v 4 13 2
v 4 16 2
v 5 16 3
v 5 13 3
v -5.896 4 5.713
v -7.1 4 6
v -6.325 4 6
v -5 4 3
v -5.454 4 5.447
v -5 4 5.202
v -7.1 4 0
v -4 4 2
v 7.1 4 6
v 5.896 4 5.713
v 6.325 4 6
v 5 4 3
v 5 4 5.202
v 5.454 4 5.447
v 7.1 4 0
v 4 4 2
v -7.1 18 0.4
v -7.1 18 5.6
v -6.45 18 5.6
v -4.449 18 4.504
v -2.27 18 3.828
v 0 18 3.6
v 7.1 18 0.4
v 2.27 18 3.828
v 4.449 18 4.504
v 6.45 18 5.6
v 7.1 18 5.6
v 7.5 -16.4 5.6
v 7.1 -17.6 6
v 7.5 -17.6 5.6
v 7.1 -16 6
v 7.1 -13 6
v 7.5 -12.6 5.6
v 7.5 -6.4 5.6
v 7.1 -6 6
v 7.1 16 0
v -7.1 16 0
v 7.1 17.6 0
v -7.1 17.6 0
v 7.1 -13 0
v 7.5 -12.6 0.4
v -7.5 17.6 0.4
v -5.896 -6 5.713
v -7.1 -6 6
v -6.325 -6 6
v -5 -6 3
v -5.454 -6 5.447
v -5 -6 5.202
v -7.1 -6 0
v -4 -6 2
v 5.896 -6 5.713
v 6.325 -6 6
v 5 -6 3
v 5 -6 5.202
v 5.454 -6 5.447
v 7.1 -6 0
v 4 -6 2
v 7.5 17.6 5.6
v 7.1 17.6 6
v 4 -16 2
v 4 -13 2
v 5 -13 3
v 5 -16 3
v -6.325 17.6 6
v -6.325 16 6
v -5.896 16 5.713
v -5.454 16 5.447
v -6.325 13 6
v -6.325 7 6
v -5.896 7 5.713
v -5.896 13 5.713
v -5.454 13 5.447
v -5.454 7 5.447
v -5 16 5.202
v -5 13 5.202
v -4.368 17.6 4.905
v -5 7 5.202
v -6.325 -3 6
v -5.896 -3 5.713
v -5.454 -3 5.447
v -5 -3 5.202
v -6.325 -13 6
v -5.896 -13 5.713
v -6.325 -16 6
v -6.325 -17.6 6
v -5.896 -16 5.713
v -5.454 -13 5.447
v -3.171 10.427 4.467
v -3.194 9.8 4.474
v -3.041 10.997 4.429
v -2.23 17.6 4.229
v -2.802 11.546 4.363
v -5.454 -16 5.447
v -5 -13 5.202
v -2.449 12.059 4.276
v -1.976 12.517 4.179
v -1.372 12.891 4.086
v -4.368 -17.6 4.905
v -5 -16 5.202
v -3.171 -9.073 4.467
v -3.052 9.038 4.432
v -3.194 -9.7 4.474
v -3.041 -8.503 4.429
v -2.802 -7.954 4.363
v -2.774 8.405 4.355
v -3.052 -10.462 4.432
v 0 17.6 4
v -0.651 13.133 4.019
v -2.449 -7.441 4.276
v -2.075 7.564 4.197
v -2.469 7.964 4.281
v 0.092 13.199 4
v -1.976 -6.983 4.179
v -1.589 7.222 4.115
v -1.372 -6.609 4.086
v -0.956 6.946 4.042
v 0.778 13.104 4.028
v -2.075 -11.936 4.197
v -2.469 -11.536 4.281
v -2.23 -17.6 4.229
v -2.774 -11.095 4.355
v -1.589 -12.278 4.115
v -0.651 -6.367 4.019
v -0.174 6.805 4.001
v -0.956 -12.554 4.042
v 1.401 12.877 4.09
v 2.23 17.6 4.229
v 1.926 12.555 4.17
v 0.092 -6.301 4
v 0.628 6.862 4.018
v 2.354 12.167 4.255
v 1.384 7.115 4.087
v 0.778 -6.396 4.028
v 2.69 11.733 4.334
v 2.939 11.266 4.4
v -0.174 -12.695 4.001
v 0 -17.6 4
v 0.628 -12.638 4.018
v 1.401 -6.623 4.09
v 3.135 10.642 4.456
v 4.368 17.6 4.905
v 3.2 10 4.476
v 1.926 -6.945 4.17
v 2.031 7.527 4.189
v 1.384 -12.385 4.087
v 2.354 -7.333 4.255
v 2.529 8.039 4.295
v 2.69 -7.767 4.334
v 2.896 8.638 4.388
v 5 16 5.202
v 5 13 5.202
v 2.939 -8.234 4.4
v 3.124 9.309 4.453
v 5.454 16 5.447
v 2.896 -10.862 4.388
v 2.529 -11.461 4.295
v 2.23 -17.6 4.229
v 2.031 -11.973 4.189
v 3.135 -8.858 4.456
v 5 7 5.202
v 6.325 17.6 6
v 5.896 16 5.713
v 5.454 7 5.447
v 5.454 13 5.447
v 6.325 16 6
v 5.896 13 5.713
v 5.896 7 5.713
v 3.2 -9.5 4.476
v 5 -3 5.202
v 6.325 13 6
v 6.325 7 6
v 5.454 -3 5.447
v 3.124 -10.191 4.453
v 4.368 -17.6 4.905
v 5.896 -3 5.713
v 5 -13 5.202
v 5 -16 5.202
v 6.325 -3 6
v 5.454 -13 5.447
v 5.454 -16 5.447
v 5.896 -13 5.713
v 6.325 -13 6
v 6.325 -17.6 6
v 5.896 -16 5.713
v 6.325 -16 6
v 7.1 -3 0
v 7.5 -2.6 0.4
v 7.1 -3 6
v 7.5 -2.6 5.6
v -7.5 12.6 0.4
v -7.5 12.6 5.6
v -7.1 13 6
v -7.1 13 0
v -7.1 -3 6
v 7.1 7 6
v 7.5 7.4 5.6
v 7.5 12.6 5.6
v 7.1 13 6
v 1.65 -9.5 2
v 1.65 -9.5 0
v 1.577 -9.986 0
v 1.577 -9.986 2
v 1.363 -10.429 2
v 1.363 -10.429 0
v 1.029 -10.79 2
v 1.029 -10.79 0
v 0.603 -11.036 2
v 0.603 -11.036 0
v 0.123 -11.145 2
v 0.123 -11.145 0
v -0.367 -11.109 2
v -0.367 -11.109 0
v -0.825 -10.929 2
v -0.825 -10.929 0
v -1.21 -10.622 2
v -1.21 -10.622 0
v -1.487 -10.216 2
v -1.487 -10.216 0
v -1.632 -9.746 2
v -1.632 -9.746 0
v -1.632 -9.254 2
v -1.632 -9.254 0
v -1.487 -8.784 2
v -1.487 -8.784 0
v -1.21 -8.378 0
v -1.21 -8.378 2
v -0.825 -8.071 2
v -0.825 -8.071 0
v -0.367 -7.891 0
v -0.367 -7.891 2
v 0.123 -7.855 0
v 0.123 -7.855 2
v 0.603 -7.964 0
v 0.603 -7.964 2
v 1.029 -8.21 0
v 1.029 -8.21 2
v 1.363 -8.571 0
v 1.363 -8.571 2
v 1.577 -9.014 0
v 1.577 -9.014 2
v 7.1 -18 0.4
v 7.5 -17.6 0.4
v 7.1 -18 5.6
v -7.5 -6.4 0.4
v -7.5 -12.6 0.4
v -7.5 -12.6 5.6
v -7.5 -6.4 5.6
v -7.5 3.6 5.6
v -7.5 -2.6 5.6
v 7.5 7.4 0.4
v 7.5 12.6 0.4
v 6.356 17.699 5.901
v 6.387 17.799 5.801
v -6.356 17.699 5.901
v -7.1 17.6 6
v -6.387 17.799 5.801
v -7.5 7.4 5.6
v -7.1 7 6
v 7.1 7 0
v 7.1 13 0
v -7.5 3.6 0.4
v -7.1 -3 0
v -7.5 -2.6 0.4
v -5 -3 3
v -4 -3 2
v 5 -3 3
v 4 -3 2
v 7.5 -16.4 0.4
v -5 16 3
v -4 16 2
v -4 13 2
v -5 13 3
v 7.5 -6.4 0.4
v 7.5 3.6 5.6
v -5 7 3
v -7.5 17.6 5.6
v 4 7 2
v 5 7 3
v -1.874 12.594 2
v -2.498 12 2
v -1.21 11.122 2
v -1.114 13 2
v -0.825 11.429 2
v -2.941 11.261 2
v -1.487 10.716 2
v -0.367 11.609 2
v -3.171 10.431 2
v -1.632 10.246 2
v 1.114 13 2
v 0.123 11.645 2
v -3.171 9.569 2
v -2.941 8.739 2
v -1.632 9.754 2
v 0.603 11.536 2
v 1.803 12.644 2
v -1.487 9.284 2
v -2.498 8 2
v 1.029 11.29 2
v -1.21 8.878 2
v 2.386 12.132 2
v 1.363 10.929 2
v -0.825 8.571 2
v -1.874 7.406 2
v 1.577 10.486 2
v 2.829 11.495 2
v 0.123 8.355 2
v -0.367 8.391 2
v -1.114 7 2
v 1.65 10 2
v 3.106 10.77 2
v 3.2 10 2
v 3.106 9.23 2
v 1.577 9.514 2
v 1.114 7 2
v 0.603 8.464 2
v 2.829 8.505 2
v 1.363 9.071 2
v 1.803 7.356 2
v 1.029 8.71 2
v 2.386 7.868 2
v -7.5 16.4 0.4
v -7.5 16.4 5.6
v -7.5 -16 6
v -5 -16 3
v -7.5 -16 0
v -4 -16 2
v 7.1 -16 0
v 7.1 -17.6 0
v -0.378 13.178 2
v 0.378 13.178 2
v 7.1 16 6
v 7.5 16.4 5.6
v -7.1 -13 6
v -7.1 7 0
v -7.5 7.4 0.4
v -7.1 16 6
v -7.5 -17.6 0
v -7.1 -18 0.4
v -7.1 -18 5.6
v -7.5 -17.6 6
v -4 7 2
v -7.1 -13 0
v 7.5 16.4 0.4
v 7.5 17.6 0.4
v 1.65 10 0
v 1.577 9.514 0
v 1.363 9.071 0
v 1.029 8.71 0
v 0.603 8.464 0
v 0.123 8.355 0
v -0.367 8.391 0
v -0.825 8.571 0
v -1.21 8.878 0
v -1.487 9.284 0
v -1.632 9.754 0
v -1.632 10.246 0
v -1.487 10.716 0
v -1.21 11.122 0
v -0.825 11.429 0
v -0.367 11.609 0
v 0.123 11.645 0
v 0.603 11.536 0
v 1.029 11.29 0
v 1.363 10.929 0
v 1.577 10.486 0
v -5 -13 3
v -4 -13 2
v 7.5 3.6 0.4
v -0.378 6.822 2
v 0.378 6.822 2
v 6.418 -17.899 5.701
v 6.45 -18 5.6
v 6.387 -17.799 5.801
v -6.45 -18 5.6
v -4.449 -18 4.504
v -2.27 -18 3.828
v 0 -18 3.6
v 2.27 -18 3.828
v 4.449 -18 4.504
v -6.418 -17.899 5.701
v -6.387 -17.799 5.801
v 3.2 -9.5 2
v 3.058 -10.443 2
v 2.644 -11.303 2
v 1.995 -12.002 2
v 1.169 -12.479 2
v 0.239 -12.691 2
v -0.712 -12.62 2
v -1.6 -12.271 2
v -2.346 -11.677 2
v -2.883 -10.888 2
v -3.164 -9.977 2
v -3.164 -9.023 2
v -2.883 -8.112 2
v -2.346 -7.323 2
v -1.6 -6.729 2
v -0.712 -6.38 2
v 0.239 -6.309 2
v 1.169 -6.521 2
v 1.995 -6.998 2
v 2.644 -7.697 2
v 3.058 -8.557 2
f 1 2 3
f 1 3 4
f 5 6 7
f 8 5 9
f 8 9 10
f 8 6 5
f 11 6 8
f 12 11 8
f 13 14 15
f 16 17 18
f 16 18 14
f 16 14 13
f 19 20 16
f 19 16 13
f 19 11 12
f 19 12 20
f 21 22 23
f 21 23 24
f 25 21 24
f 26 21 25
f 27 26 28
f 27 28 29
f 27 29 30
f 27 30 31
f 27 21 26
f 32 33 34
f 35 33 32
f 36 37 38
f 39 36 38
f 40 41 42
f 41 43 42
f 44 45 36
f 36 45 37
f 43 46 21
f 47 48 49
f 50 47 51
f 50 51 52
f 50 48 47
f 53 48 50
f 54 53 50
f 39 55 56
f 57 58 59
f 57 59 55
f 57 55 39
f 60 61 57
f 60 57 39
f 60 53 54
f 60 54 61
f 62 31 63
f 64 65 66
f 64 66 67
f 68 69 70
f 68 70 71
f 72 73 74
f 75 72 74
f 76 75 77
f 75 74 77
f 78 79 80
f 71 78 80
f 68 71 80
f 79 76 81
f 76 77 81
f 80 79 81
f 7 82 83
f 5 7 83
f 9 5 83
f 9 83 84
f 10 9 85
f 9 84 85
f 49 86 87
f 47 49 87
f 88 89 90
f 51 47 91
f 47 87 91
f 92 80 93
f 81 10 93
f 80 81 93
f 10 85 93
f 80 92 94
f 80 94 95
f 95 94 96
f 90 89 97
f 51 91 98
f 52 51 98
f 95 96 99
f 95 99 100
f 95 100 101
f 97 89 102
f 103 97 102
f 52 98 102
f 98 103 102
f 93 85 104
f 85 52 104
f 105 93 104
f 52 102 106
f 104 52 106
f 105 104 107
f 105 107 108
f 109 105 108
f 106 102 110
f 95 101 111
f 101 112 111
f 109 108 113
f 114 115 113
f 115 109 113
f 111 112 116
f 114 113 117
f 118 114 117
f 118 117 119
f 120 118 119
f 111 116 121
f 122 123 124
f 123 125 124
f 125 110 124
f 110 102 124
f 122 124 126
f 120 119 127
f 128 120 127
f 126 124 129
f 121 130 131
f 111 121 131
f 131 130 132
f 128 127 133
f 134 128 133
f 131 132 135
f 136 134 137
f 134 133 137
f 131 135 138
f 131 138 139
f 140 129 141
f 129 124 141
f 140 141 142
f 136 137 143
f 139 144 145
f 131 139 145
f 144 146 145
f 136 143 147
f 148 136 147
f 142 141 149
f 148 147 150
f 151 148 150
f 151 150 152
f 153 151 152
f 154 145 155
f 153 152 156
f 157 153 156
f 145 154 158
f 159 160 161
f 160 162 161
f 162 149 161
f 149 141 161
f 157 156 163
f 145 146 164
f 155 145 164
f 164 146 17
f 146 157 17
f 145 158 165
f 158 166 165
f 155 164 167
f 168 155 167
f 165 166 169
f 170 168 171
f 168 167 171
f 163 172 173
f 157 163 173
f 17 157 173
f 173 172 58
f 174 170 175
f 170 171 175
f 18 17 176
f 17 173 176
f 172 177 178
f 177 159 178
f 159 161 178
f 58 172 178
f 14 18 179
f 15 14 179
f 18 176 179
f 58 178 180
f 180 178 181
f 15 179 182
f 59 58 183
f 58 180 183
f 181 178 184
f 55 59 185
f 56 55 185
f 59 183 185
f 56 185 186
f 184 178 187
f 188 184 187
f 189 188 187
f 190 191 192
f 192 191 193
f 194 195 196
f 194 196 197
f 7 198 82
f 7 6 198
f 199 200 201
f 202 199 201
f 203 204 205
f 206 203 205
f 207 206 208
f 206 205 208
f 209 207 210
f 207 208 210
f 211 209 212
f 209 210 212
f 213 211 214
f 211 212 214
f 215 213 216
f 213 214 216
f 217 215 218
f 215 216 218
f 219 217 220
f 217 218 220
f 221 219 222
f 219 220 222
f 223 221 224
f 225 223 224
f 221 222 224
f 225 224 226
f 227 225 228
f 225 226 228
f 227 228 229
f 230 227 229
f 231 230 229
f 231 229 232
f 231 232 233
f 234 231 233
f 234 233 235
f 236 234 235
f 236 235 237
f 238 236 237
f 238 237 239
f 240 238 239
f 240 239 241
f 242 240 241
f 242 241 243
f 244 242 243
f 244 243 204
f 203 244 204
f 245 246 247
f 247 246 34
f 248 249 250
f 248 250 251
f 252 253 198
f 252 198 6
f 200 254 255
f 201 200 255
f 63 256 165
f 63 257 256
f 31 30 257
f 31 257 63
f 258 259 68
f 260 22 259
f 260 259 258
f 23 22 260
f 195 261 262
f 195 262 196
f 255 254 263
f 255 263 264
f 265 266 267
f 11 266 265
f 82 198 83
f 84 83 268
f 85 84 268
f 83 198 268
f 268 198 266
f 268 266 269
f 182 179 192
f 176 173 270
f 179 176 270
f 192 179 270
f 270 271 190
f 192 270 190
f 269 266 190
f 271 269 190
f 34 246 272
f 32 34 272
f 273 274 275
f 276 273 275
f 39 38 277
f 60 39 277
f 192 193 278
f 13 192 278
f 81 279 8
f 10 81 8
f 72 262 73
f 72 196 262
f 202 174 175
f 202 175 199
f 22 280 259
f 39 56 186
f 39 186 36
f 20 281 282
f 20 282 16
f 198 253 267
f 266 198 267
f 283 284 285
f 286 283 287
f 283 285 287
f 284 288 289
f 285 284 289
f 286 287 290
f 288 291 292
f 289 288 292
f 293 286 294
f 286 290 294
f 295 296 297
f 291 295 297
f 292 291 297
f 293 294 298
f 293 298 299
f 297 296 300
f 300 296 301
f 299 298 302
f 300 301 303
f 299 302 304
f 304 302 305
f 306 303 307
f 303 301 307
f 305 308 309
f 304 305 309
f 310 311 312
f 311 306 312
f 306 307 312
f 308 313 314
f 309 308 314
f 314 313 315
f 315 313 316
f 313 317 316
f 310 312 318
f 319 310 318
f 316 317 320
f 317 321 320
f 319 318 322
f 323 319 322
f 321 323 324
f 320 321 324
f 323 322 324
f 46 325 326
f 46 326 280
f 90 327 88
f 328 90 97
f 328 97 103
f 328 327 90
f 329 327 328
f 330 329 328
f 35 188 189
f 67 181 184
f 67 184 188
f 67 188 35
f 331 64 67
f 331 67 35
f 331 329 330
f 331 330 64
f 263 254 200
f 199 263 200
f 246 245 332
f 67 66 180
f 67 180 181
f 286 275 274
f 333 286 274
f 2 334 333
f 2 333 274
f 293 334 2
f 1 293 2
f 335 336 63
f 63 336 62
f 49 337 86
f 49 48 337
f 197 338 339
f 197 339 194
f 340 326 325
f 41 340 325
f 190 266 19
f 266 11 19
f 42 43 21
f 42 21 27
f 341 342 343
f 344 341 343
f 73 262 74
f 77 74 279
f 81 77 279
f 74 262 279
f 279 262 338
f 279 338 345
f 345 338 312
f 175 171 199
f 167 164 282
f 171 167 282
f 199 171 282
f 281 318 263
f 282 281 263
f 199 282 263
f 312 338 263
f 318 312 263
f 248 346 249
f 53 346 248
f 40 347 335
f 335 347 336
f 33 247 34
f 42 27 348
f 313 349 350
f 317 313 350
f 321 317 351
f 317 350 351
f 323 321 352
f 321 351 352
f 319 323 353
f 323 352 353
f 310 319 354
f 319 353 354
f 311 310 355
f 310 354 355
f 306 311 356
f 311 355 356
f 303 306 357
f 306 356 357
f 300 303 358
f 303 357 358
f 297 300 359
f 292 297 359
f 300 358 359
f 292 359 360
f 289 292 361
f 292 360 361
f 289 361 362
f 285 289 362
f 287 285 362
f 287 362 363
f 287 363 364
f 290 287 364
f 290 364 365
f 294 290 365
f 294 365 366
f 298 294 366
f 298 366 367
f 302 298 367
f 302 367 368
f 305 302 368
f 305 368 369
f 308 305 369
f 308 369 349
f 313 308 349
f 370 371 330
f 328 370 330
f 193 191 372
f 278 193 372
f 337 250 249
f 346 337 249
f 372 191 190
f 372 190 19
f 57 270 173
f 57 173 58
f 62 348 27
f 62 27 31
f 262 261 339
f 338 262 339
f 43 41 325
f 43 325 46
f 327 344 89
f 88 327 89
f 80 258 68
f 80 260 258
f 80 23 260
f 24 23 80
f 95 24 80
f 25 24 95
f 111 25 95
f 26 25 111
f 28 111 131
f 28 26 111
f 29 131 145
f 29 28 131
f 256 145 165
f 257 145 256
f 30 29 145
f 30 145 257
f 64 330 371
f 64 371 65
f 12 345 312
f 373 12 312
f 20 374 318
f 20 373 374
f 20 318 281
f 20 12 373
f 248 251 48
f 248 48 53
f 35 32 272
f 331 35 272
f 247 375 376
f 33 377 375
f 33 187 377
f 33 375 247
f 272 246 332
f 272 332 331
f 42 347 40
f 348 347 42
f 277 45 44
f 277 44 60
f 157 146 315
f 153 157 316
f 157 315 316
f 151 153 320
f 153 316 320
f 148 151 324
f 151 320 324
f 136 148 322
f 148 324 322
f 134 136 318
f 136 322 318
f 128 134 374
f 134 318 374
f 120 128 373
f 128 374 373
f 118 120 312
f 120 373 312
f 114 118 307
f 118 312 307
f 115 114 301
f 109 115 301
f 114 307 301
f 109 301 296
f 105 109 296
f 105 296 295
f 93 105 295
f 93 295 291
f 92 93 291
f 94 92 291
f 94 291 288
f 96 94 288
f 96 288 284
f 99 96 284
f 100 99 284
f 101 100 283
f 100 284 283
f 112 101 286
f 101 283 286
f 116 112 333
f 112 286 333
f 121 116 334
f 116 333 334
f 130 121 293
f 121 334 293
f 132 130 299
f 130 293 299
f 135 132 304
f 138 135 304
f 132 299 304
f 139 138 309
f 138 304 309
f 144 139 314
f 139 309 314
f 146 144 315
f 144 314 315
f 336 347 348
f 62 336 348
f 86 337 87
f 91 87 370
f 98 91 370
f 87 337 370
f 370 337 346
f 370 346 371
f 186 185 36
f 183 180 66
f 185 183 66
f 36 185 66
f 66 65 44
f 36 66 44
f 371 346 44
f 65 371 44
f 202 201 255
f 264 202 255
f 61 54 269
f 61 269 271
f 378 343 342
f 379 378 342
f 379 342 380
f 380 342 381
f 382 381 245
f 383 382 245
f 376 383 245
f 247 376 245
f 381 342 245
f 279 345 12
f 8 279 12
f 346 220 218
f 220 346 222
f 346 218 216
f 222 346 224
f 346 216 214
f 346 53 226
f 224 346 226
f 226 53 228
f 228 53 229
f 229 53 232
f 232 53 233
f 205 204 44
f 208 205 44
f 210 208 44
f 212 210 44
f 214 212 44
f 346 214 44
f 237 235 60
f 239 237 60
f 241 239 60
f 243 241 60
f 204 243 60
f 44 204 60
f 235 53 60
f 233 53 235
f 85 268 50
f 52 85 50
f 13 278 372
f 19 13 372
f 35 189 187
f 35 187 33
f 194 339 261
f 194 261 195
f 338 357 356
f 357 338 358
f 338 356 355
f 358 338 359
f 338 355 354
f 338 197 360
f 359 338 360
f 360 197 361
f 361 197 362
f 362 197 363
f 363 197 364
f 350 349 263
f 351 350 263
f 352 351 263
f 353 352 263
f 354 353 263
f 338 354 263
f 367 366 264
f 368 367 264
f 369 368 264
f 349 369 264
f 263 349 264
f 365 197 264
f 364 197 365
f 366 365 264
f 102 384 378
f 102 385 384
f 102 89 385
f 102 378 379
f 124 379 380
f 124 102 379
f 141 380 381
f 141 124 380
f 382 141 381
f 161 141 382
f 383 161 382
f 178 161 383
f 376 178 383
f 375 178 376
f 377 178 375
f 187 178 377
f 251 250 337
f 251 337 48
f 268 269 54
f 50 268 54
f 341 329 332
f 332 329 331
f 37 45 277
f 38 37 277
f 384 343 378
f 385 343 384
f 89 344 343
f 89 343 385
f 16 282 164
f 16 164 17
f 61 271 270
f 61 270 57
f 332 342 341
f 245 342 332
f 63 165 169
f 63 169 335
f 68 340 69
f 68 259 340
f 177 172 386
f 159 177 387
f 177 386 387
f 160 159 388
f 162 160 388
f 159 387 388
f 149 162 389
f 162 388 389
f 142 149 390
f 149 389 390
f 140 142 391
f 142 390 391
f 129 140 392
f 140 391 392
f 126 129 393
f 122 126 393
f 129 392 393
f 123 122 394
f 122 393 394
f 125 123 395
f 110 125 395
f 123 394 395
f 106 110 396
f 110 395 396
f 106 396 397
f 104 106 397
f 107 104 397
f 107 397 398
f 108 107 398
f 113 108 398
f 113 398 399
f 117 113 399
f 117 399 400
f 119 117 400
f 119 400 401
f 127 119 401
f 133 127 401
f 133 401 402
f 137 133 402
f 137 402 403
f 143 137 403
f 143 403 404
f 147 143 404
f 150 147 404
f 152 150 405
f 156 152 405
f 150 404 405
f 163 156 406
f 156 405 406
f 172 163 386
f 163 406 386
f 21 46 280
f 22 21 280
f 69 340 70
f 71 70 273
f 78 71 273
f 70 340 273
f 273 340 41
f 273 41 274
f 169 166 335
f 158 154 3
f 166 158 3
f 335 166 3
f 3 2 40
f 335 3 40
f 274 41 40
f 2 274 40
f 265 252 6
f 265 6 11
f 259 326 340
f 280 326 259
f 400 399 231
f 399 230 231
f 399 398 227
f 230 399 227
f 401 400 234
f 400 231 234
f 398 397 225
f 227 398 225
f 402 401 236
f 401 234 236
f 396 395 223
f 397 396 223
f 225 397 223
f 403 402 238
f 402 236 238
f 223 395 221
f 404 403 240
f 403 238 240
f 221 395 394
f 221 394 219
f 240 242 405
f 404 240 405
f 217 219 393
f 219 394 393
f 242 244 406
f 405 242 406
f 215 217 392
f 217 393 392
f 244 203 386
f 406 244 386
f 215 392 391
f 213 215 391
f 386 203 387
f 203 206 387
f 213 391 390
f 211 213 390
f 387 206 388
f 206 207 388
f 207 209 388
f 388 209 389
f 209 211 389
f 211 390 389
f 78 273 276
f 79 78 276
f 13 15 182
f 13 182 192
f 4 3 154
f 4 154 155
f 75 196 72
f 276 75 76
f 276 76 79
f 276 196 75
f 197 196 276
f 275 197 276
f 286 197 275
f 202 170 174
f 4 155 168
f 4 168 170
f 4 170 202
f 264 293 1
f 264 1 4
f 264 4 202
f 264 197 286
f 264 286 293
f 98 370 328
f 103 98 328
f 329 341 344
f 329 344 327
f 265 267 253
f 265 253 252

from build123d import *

# Parameters (mm, degrees)
SKETCH_W                                   = 15
SKETCH_H                                   = 36
PAD_DEPTH                                  = 6
SKETCH001_W                                = 20
SKETCH001_H                                = 3
POCKET_DEPTH                               = 2
SKETCH002_W                                = 3
SKETCH002_H                                = 3
POCKET001_DEPTH                            = 6.001
SKETCH003_R                                = 11
POCKET002_DEPTH                            = 36.001
SKETCH004_R                                = 1.65
POCKET003_DEPTH                            = 6.001
SKETCH005_R                                = 3.2
POCKET004_DEPTH                            = 4.001
CHAMFER004013007011015006009007001023_SIZE = 0.4
CHAMFER004013007011015006009007001024_SIZE = 1


with BuildPart() as part:
    # Sketch → Pad (new body)
    with BuildSketch(Plane.XY):
        Rectangle(SKETCH_W, SKETCH_H)
    extrude(amount=PAD_DEPTH)

    # Sketch001 (on Face5 of Pad) → Pocket (cut)
    with BuildSketch(Plane(origin=(0, 0, 0), x_dir=(1, 0, 0), z_dir=(0, 0, -1))):
        with Locations((0, 14.5)):
            Rectangle(SKETCH001_W, SKETCH001_H)
        with Locations((0, 4.5)):
            Rectangle(SKETCH001_W, SKETCH001_H)
        with Locations((0, -5.5)):
            Rectangle(SKETCH001_W, SKETCH001_H)
        with Locations((0, -14.5)):
            Rectangle(SKETCH001_W, SKETCH001_H)
    extrude(amount=-POCKET_DEPTH, mode=Mode.SUBTRACT)

    # Sketch002 (on Face10 of Pocket) → Pocket001 (cut, through all)
    with BuildSketch(Plane(origin=(0, 0, 0), x_dir=(1, 0, 0), z_dir=(0, 0, -1))):
        with Locations((-6.5, 14.5)):
            Rectangle(SKETCH002_W, SKETCH002_H)
        with Locations((6.5, 14.5)):
            Rectangle(SKETCH002_W, SKETCH002_H)
        with Locations((-6.5, 4.5)):
            Rectangle(SKETCH002_W, SKETCH002_H)
        with Locations((6.5, 4.5)):
            Rectangle(SKETCH002_W, SKETCH002_H)
        with Locations((-6.5, -5.5)):
            Rectangle(SKETCH002_W, SKETCH002_H)
        with Locations((6.5, -5.5)):
            Rectangle(SKETCH002_W, SKETCH002_H)
        with Locations((-6.5, -14.5)):
            Rectangle(SKETCH002_W, SKETCH002_H)
        with Locations((6.5, -14.5)):
            Rectangle(SKETCH002_W, SKETCH002_H)
    extrude(amount=-POCKET001_DEPTH, mode=Mode.SUBTRACT)

    # Sketch003 (on Face26 of Pocket001) → Pocket002 (cut, through all)
    with BuildSketch(Plane.XZ.offset(18)):
        with Locations((0, 15)):
            Circle(SKETCH003_R)
    extrude(amount=-POCKET002_DEPTH, mode=Mode.SUBTRACT)

    # Sketch004 (on Face77 of Pocket002) → Pocket003 (cut, through all)
    with BuildSketch(Plane(origin=(0, 0, 0), x_dir=(1, 0, 0), z_dir=(0, 0, -1))):
        with Locations((0, 9.5)):
            Circle(SKETCH004_R)
        with Locations((0, -10)):
            Circle(SKETCH004_R)
    extrude(amount=-POCKET003_DEPTH, mode=Mode.SUBTRACT)

    # Sketch005 (on Face74 of Pocket003) → Pocket004 (cut, through all)
    with BuildSketch(Plane(origin=(0, 0, 2), x_dir=(1, 0, 0), z_dir=(0, 0, -1))):
        with Locations((0, 9.5)):
            Circle(SKETCH005_R)
        with Locations((0, -10)):
            Circle(SKETCH005_R)
    extrude(amount=-POCKET004_DEPTH, mode=Mode.SUBTRACT)

    # Chamfer004013007011015006009007001023
    chamfer004013007011015006009007001023_edges = [part.edges().sort_by_distance(p)[0] for p in [
        (0, -18, 0),
        (-7.5, -18, 3),
        (-6.912278, -18, 6),
        (0, -18, 4),
        (6.912278, -18, 6),
        (7.5, -18, 3),
        (-7.5, -13, 1),
        (-7.5, -9.5, 0),
        (-7.5, -6, 1),
        (-7.5, -6, 4),
        (-7.5, -9.5, 6),
        (-7.5, -13, 4),
        (-7.5, -3, 4),
        (-7.5, -3, 1),
        (-7.5, 0.5, 0),
        (-7.5, 4, 1),
        (-7.5, 4, 4),
        (-7.5, 0.5, 6),
        (-7.5, 7, 4),
        (-7.5, 7, 1),
        (-7.5, 10, 0),
        (-7.5, 13, 1),
        (-7.5, 13, 4),
        (-7.5, 10, 6),
        (-7.5, 16, 4),
        (-7.5, 16, 1),
        (-7.5, 17, 0),
        (-7.5, 18, 3),
        (-7.5, 17, 6),
        (0, 18, 0),
        (7.5, 18, 3),
        (6.912278, 18, 6),
        (0, 18, 4),
        (-6.912278, 18, 6),
        (7.5, -16, 4),
        (7.5, -16, 1),
        (7.5, -17, 0),
        (7.5, -17, 6),
        (7.5, -6, 4),
        (7.5, -6, 1),
        (7.5, -9.5, 0),
        (7.5, -13, 1),
        (7.5, -13, 4),
        (7.5, -9.5, 6),
        (7.5, 4, 4),
        (7.5, 4, 1),
        (7.5, 0.5, 0),
        (7.5, -3, 1),
        (7.5, -3, 4),
        (7.5, 0.5, 6),
        (7.5, 13, 1),
        (7.5, 10, 0),
        (7.5, 7, 1),
        (7.5, 7, 4),
        (7.5, 10, 6),
        (7.5, 13, 4),
        (7.5, 17, 0),
        (7.5, 16, 1),
        (7.5, 16, 4),
        (7.5, 17, 6),
    ]]
    chamfer(chamfer004013007011015006009007001023_edges, length=CHAMFER004013007011015006009007001023_SIZE)

    # Chamfer004013007011015006009007001024
    chamfer004013007011015006009007001024_edges = [part.edges().sort_by_distance(p)[0] for p in [
        (-5, -14.5, 2),
        (5, -14.5, 2),
        (5, -4.5, 2),
        (-5, -4.5, 2),
        (-5, 5.5, 2),
        (5, 5.5, 2),
        (5, 14.5, 2),
        (-5, 14.5, 2),
    ]]
    chamfer(chamfer004013007011015006009007001024_edges, length=CHAMFER004013007011015006009007001024_SIZE)


solid = part.part
